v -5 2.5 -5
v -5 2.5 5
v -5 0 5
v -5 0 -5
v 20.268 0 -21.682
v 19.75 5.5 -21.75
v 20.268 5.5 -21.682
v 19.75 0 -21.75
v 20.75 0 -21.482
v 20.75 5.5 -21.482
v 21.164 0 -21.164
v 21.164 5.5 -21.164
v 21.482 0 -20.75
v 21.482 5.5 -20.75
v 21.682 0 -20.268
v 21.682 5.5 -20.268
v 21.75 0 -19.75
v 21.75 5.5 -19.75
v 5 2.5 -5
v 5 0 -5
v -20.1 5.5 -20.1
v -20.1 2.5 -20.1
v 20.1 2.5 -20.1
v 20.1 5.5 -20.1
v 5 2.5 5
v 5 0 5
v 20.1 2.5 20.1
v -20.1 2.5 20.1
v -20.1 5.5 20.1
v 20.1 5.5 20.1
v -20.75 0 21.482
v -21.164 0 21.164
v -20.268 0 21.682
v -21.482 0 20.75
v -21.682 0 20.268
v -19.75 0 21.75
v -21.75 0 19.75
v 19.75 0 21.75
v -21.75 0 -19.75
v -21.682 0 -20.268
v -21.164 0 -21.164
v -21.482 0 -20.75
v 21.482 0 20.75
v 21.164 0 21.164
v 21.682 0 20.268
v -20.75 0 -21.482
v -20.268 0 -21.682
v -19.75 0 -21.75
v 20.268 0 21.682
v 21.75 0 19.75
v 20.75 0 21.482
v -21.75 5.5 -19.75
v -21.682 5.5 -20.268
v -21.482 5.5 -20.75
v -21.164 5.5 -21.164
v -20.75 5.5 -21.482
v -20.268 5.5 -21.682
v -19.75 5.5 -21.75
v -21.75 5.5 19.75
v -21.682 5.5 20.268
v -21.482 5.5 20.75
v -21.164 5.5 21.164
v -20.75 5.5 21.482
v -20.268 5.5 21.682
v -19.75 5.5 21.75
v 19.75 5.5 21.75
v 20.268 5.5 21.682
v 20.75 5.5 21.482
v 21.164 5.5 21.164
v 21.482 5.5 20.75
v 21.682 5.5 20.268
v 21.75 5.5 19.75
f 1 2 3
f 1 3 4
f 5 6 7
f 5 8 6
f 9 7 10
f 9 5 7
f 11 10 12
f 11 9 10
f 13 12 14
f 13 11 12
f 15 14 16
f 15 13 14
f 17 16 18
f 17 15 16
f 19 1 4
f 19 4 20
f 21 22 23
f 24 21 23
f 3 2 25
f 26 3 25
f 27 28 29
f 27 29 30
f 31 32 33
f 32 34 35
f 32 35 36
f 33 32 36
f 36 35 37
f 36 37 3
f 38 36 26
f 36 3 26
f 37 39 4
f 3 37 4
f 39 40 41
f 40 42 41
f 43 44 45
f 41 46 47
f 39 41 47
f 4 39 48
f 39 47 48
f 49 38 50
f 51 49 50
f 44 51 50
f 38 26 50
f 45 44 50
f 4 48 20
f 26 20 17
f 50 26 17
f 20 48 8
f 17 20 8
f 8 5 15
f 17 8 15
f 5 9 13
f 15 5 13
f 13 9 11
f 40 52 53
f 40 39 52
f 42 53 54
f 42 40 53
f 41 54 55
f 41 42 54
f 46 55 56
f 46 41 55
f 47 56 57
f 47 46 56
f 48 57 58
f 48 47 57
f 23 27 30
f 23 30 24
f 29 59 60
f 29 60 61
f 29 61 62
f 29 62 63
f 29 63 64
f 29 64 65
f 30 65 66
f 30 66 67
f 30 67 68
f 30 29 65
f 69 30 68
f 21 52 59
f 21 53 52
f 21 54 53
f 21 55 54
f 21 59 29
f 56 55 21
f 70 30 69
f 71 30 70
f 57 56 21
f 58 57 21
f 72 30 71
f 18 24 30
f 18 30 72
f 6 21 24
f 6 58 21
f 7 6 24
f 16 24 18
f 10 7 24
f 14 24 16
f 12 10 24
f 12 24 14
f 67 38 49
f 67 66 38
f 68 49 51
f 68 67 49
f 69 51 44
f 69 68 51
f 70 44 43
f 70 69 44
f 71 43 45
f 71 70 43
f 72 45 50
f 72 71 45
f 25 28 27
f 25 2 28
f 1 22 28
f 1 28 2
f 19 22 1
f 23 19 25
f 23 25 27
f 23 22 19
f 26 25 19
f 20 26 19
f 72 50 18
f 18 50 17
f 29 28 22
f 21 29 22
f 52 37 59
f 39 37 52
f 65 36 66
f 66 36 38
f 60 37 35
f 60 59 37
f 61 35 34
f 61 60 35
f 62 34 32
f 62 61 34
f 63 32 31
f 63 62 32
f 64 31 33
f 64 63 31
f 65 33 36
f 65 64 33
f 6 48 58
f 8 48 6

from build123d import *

# Parameters (mm, degrees)
SKETCH1_W           = 43.5
SKETCH1_H           = 43.5
BOSS_EXTRUDE2_DEPTH = 2.5
SKETCH3_W           = 43.5
SKETCH3_H           = 43.5
SKETCH3_W_2         = 40.2
SKETCH3_H_2         = 40.2
BOSS_EXTRUDE3_DEPTH = 3
SKETCH4_W           = 10
SKETCH4_H           = 10
CUT_EXTRUDE1_DEPTH  = 5
FILLET1_R           = 2


with BuildPart() as part:
    # Sketch1 → Boss-Extrude2 (new body)
    with BuildSketch(Plane(origin=(0, 0, 0), x_dir=(1, 0, 0), z_dir=(0, 1, 0))):
        Rectangle(SKETCH1_W, SKETCH1_H)
    extrude(amount=BOSS_EXTRUDE2_DEPTH)

    # Sketch3 → Boss-Extrude3 (add)
    with BuildSketch(Plane(origin=(0, 2.5, 0), x_dir=(1, 0, 0), z_dir=(0, 1, 0))):
        Rectangle(SKETCH3_W, SKETCH3_H)
        Rectangle(SKETCH3_W_2, SKETCH3_H_2, mode=Mode.SUBTRACT)
    extrude(amount=BOSS_EXTRUDE3_DEPTH)

    # Sketch4 → Cut-Extrude1 (cut)
    with BuildSketch(Plane(origin=(0, 2.5, 0), x_dir=(1, 0, 0), z_dir=(0, 1, 0))):
        Rectangle(SKETCH4_W, SKETCH4_H)
    extrude(amount=-CUT_EXTRUDE1_DEPTH, mode=Mode.SUBTRACT)

    # Fillet1
    fillet1_edges = [part.edges().sort_by_distance(p)[0] for p in [
        (21.75, 2.75, 21.75),
        (-21.75, 2.75, 21.75),
        (-21.75, 2.75, -21.75),
        (21.75, 2.75, -21.75),
    ]]
    fillet(fillet1_edges, radius=FILLET1_R)


solid = part.part
